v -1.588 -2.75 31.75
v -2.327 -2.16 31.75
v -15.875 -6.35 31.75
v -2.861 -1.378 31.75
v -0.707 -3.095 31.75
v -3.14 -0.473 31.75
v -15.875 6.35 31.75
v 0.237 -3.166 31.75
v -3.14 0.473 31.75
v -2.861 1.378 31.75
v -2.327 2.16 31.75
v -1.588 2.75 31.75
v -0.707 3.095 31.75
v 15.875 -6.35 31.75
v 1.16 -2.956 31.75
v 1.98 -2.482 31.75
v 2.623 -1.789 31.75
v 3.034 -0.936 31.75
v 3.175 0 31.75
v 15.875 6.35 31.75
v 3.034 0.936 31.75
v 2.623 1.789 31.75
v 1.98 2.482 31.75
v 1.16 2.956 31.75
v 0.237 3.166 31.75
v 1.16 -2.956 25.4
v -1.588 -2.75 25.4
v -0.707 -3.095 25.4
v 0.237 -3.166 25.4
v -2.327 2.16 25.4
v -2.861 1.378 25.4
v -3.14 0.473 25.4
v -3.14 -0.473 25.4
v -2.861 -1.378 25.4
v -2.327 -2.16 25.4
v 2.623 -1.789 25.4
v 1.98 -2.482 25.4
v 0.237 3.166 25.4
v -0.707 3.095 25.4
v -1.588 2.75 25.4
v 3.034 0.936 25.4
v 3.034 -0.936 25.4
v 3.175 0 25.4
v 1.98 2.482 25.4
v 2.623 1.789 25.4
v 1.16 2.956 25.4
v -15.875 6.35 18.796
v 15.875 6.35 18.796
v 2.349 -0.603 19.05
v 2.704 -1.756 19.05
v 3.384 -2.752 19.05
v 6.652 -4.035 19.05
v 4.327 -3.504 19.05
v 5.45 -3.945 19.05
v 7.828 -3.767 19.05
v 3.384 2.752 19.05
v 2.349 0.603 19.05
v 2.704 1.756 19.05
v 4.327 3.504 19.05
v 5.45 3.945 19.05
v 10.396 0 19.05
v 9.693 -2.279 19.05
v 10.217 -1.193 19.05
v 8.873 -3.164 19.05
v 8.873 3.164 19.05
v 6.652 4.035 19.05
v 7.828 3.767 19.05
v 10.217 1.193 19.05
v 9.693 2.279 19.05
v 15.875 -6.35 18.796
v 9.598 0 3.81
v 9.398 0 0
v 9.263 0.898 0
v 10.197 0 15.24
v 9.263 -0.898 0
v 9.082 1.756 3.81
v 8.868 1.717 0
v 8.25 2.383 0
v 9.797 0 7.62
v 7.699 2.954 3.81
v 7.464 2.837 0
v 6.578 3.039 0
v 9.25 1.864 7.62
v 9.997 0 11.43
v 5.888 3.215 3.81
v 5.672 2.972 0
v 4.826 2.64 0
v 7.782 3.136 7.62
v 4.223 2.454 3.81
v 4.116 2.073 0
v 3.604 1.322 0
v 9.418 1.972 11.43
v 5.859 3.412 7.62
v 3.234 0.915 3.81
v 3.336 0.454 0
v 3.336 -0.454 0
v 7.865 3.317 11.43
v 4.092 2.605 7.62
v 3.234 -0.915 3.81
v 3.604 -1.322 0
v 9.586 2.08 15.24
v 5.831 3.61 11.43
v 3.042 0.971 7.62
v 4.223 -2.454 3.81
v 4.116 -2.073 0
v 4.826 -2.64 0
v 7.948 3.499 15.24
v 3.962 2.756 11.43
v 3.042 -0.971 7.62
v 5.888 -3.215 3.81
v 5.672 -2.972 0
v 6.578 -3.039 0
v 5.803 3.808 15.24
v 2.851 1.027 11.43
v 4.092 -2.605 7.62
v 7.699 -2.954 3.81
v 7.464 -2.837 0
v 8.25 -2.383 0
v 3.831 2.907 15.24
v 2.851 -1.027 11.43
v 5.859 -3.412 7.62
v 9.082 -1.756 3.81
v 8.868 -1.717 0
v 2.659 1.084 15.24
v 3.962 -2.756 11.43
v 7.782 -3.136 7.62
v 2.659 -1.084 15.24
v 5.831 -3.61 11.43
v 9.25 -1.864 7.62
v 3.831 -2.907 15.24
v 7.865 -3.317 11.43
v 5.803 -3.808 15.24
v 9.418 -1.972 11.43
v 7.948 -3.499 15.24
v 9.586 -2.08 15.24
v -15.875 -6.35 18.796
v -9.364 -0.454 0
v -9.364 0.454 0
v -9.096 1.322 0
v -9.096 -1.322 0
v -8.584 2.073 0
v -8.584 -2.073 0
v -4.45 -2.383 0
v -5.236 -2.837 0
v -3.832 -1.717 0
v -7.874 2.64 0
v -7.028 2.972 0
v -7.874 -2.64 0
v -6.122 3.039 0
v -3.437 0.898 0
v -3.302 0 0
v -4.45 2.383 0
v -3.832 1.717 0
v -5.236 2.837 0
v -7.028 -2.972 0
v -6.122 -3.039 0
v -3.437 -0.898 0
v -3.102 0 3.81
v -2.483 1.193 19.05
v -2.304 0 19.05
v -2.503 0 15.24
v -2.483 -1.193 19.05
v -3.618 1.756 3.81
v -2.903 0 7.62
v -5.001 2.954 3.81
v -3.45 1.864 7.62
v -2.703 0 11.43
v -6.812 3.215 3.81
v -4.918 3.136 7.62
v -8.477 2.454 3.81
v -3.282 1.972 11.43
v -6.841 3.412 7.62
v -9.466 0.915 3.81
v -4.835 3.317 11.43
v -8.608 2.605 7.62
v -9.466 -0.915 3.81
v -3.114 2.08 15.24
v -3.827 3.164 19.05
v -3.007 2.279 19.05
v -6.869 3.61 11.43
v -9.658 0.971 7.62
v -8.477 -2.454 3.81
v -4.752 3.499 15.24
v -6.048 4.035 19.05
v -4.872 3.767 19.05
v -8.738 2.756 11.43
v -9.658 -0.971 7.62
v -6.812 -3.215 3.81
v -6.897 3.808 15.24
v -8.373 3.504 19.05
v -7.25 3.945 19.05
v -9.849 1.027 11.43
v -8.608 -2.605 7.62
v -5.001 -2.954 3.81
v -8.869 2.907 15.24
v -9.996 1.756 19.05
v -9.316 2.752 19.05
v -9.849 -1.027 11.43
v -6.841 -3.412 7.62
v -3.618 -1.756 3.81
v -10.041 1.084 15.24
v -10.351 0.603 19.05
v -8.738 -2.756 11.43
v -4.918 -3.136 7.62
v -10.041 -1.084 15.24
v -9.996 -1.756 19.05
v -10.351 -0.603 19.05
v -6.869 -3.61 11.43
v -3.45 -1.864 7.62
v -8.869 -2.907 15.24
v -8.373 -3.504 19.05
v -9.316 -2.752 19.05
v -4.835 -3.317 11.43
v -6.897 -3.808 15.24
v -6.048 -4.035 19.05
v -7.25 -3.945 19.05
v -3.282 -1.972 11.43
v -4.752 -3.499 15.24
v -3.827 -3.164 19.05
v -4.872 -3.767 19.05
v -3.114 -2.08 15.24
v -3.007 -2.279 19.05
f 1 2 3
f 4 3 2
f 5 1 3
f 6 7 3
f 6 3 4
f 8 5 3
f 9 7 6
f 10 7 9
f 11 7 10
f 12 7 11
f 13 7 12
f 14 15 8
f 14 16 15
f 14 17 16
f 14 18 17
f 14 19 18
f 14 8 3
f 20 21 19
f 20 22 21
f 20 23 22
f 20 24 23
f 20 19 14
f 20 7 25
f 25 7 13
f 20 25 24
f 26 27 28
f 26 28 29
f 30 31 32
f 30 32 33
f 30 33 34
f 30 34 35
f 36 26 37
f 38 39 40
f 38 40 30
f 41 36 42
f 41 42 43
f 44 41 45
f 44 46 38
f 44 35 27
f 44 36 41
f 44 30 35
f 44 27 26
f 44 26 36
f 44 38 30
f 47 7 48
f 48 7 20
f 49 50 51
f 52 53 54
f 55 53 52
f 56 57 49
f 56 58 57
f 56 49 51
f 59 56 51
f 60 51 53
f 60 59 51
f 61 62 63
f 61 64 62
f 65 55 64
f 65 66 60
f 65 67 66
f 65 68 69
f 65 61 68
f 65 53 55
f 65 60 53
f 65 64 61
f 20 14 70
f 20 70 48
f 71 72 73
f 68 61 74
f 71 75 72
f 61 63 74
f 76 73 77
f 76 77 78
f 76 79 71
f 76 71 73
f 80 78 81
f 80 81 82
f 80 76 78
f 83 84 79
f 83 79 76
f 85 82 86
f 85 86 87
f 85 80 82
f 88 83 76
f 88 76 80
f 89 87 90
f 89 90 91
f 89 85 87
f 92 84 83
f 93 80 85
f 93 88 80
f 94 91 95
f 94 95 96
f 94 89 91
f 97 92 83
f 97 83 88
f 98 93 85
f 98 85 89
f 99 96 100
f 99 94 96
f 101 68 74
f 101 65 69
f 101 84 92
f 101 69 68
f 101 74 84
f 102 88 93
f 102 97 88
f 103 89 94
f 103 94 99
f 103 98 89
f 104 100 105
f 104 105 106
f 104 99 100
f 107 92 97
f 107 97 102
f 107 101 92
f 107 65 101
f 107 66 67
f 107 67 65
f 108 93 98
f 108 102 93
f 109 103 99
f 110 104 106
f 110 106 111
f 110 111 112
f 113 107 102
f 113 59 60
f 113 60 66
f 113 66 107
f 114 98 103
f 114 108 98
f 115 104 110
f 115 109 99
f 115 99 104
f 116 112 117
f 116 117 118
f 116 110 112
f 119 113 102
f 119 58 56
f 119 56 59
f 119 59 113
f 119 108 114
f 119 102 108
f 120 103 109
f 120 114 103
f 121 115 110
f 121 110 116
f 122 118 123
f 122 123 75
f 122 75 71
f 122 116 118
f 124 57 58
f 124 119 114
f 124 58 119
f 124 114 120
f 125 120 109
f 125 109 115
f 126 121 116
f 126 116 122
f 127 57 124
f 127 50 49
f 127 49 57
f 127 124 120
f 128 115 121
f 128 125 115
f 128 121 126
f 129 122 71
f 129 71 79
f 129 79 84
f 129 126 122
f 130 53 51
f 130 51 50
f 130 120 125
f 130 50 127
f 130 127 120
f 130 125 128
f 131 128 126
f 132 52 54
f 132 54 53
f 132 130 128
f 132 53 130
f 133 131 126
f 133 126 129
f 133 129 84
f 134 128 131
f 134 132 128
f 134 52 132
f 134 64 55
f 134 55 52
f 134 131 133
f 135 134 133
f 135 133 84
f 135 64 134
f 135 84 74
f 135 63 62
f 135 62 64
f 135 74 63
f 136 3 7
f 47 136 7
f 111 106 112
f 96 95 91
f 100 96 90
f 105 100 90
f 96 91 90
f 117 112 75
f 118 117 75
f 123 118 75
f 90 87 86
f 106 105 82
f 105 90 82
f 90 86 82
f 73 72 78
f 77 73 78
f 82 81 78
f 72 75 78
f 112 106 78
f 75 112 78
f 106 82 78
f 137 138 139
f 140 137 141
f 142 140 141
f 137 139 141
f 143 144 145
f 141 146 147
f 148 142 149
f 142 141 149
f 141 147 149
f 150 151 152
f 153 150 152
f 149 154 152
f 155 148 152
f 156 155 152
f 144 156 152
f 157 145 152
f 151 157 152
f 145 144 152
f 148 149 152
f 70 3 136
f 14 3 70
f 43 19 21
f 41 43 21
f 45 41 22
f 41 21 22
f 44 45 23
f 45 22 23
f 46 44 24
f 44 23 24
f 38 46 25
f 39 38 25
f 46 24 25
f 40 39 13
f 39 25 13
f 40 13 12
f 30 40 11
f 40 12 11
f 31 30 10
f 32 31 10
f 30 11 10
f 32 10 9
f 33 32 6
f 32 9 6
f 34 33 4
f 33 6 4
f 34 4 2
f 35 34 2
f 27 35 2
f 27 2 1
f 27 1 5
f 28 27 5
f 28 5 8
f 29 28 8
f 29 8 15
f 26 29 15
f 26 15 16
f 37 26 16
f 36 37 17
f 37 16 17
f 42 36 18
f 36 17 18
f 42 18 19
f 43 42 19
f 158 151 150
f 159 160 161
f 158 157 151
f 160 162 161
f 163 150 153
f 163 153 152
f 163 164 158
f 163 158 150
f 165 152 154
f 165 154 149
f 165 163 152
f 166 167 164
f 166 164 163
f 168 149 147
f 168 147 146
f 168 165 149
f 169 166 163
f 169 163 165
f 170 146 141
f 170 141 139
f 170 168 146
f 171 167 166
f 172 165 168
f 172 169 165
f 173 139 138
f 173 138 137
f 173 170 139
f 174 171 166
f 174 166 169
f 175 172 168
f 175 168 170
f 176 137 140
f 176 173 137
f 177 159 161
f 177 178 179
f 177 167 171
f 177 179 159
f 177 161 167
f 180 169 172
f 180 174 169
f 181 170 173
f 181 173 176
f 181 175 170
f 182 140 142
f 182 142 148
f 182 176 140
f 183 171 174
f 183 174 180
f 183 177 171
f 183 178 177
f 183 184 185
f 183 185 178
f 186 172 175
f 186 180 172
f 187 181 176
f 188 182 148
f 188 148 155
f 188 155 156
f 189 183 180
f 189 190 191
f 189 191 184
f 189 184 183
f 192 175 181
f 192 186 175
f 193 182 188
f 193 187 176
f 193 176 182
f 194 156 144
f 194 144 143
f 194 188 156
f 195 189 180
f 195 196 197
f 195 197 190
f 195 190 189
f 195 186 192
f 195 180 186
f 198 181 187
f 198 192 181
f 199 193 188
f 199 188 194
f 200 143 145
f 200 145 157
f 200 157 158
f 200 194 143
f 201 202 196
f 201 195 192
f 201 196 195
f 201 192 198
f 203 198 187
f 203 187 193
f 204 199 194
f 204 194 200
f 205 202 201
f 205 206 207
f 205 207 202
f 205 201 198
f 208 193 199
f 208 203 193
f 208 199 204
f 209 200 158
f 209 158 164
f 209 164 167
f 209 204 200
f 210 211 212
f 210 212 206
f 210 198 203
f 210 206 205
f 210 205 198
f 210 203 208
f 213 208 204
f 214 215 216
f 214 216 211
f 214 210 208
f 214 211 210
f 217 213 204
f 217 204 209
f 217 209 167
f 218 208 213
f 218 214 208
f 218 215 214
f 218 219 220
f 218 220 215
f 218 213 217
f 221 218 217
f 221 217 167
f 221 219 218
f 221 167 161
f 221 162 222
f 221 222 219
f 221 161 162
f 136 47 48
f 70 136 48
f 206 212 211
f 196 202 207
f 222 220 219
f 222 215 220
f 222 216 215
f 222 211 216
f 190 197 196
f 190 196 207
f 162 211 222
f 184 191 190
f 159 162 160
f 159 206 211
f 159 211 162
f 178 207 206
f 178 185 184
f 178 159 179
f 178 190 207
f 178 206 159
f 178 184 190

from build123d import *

# Parameters (mm, degrees)
F0_R          = 3.048
F1_DEPTH      = 19.05
F1_TAPER      = -3
F2_W          = 31.75
F2_H          = 12.7
F3_DEPTH      = 12.7
F3_DEPTH_BACK = 0.254
F4_R          = 3.175
F5_DEPTH      = 6.35


with BuildPart() as f1:
    # F0 (on Top) → F1 (new body)
    with BuildSketch(Plane.XY):
        with Locations((6.35, 0)):
            Circle(F0_R)
    extrude(amount=F1_DEPTH, taper=F1_TAPER)


with BuildPart() as f1b:
    # F0 (on Top) → F1, piece 2 (new body)
    with BuildSketch(Plane.XY):
        with Locations((-6.35, 0)):
            Circle(F0_R)
    extrude(amount=F1_DEPTH, taper=F1_TAPER)


with BuildPart() as f3:
    # F2 (on face) → F3 (new body, two sides)
    with BuildSketch(Plane.XY.offset(19.05)) as f3_sk:
        Rectangle(F2_W, F2_H)
    extrude(amount=F3_DEPTH)
    extrude(f3_sk.sketch, amount=-F3_DEPTH_BACK)

    # F4 (on face) → F5 (cut)
    with BuildSketch(Plane.XY.offset(31.75)):
        Circle(F4_R)
    extrude(amount=-F5_DEPTH, mode=Mode.SUBTRACT)


solid = Compound([f1.part, f1b.part, f3.part])
